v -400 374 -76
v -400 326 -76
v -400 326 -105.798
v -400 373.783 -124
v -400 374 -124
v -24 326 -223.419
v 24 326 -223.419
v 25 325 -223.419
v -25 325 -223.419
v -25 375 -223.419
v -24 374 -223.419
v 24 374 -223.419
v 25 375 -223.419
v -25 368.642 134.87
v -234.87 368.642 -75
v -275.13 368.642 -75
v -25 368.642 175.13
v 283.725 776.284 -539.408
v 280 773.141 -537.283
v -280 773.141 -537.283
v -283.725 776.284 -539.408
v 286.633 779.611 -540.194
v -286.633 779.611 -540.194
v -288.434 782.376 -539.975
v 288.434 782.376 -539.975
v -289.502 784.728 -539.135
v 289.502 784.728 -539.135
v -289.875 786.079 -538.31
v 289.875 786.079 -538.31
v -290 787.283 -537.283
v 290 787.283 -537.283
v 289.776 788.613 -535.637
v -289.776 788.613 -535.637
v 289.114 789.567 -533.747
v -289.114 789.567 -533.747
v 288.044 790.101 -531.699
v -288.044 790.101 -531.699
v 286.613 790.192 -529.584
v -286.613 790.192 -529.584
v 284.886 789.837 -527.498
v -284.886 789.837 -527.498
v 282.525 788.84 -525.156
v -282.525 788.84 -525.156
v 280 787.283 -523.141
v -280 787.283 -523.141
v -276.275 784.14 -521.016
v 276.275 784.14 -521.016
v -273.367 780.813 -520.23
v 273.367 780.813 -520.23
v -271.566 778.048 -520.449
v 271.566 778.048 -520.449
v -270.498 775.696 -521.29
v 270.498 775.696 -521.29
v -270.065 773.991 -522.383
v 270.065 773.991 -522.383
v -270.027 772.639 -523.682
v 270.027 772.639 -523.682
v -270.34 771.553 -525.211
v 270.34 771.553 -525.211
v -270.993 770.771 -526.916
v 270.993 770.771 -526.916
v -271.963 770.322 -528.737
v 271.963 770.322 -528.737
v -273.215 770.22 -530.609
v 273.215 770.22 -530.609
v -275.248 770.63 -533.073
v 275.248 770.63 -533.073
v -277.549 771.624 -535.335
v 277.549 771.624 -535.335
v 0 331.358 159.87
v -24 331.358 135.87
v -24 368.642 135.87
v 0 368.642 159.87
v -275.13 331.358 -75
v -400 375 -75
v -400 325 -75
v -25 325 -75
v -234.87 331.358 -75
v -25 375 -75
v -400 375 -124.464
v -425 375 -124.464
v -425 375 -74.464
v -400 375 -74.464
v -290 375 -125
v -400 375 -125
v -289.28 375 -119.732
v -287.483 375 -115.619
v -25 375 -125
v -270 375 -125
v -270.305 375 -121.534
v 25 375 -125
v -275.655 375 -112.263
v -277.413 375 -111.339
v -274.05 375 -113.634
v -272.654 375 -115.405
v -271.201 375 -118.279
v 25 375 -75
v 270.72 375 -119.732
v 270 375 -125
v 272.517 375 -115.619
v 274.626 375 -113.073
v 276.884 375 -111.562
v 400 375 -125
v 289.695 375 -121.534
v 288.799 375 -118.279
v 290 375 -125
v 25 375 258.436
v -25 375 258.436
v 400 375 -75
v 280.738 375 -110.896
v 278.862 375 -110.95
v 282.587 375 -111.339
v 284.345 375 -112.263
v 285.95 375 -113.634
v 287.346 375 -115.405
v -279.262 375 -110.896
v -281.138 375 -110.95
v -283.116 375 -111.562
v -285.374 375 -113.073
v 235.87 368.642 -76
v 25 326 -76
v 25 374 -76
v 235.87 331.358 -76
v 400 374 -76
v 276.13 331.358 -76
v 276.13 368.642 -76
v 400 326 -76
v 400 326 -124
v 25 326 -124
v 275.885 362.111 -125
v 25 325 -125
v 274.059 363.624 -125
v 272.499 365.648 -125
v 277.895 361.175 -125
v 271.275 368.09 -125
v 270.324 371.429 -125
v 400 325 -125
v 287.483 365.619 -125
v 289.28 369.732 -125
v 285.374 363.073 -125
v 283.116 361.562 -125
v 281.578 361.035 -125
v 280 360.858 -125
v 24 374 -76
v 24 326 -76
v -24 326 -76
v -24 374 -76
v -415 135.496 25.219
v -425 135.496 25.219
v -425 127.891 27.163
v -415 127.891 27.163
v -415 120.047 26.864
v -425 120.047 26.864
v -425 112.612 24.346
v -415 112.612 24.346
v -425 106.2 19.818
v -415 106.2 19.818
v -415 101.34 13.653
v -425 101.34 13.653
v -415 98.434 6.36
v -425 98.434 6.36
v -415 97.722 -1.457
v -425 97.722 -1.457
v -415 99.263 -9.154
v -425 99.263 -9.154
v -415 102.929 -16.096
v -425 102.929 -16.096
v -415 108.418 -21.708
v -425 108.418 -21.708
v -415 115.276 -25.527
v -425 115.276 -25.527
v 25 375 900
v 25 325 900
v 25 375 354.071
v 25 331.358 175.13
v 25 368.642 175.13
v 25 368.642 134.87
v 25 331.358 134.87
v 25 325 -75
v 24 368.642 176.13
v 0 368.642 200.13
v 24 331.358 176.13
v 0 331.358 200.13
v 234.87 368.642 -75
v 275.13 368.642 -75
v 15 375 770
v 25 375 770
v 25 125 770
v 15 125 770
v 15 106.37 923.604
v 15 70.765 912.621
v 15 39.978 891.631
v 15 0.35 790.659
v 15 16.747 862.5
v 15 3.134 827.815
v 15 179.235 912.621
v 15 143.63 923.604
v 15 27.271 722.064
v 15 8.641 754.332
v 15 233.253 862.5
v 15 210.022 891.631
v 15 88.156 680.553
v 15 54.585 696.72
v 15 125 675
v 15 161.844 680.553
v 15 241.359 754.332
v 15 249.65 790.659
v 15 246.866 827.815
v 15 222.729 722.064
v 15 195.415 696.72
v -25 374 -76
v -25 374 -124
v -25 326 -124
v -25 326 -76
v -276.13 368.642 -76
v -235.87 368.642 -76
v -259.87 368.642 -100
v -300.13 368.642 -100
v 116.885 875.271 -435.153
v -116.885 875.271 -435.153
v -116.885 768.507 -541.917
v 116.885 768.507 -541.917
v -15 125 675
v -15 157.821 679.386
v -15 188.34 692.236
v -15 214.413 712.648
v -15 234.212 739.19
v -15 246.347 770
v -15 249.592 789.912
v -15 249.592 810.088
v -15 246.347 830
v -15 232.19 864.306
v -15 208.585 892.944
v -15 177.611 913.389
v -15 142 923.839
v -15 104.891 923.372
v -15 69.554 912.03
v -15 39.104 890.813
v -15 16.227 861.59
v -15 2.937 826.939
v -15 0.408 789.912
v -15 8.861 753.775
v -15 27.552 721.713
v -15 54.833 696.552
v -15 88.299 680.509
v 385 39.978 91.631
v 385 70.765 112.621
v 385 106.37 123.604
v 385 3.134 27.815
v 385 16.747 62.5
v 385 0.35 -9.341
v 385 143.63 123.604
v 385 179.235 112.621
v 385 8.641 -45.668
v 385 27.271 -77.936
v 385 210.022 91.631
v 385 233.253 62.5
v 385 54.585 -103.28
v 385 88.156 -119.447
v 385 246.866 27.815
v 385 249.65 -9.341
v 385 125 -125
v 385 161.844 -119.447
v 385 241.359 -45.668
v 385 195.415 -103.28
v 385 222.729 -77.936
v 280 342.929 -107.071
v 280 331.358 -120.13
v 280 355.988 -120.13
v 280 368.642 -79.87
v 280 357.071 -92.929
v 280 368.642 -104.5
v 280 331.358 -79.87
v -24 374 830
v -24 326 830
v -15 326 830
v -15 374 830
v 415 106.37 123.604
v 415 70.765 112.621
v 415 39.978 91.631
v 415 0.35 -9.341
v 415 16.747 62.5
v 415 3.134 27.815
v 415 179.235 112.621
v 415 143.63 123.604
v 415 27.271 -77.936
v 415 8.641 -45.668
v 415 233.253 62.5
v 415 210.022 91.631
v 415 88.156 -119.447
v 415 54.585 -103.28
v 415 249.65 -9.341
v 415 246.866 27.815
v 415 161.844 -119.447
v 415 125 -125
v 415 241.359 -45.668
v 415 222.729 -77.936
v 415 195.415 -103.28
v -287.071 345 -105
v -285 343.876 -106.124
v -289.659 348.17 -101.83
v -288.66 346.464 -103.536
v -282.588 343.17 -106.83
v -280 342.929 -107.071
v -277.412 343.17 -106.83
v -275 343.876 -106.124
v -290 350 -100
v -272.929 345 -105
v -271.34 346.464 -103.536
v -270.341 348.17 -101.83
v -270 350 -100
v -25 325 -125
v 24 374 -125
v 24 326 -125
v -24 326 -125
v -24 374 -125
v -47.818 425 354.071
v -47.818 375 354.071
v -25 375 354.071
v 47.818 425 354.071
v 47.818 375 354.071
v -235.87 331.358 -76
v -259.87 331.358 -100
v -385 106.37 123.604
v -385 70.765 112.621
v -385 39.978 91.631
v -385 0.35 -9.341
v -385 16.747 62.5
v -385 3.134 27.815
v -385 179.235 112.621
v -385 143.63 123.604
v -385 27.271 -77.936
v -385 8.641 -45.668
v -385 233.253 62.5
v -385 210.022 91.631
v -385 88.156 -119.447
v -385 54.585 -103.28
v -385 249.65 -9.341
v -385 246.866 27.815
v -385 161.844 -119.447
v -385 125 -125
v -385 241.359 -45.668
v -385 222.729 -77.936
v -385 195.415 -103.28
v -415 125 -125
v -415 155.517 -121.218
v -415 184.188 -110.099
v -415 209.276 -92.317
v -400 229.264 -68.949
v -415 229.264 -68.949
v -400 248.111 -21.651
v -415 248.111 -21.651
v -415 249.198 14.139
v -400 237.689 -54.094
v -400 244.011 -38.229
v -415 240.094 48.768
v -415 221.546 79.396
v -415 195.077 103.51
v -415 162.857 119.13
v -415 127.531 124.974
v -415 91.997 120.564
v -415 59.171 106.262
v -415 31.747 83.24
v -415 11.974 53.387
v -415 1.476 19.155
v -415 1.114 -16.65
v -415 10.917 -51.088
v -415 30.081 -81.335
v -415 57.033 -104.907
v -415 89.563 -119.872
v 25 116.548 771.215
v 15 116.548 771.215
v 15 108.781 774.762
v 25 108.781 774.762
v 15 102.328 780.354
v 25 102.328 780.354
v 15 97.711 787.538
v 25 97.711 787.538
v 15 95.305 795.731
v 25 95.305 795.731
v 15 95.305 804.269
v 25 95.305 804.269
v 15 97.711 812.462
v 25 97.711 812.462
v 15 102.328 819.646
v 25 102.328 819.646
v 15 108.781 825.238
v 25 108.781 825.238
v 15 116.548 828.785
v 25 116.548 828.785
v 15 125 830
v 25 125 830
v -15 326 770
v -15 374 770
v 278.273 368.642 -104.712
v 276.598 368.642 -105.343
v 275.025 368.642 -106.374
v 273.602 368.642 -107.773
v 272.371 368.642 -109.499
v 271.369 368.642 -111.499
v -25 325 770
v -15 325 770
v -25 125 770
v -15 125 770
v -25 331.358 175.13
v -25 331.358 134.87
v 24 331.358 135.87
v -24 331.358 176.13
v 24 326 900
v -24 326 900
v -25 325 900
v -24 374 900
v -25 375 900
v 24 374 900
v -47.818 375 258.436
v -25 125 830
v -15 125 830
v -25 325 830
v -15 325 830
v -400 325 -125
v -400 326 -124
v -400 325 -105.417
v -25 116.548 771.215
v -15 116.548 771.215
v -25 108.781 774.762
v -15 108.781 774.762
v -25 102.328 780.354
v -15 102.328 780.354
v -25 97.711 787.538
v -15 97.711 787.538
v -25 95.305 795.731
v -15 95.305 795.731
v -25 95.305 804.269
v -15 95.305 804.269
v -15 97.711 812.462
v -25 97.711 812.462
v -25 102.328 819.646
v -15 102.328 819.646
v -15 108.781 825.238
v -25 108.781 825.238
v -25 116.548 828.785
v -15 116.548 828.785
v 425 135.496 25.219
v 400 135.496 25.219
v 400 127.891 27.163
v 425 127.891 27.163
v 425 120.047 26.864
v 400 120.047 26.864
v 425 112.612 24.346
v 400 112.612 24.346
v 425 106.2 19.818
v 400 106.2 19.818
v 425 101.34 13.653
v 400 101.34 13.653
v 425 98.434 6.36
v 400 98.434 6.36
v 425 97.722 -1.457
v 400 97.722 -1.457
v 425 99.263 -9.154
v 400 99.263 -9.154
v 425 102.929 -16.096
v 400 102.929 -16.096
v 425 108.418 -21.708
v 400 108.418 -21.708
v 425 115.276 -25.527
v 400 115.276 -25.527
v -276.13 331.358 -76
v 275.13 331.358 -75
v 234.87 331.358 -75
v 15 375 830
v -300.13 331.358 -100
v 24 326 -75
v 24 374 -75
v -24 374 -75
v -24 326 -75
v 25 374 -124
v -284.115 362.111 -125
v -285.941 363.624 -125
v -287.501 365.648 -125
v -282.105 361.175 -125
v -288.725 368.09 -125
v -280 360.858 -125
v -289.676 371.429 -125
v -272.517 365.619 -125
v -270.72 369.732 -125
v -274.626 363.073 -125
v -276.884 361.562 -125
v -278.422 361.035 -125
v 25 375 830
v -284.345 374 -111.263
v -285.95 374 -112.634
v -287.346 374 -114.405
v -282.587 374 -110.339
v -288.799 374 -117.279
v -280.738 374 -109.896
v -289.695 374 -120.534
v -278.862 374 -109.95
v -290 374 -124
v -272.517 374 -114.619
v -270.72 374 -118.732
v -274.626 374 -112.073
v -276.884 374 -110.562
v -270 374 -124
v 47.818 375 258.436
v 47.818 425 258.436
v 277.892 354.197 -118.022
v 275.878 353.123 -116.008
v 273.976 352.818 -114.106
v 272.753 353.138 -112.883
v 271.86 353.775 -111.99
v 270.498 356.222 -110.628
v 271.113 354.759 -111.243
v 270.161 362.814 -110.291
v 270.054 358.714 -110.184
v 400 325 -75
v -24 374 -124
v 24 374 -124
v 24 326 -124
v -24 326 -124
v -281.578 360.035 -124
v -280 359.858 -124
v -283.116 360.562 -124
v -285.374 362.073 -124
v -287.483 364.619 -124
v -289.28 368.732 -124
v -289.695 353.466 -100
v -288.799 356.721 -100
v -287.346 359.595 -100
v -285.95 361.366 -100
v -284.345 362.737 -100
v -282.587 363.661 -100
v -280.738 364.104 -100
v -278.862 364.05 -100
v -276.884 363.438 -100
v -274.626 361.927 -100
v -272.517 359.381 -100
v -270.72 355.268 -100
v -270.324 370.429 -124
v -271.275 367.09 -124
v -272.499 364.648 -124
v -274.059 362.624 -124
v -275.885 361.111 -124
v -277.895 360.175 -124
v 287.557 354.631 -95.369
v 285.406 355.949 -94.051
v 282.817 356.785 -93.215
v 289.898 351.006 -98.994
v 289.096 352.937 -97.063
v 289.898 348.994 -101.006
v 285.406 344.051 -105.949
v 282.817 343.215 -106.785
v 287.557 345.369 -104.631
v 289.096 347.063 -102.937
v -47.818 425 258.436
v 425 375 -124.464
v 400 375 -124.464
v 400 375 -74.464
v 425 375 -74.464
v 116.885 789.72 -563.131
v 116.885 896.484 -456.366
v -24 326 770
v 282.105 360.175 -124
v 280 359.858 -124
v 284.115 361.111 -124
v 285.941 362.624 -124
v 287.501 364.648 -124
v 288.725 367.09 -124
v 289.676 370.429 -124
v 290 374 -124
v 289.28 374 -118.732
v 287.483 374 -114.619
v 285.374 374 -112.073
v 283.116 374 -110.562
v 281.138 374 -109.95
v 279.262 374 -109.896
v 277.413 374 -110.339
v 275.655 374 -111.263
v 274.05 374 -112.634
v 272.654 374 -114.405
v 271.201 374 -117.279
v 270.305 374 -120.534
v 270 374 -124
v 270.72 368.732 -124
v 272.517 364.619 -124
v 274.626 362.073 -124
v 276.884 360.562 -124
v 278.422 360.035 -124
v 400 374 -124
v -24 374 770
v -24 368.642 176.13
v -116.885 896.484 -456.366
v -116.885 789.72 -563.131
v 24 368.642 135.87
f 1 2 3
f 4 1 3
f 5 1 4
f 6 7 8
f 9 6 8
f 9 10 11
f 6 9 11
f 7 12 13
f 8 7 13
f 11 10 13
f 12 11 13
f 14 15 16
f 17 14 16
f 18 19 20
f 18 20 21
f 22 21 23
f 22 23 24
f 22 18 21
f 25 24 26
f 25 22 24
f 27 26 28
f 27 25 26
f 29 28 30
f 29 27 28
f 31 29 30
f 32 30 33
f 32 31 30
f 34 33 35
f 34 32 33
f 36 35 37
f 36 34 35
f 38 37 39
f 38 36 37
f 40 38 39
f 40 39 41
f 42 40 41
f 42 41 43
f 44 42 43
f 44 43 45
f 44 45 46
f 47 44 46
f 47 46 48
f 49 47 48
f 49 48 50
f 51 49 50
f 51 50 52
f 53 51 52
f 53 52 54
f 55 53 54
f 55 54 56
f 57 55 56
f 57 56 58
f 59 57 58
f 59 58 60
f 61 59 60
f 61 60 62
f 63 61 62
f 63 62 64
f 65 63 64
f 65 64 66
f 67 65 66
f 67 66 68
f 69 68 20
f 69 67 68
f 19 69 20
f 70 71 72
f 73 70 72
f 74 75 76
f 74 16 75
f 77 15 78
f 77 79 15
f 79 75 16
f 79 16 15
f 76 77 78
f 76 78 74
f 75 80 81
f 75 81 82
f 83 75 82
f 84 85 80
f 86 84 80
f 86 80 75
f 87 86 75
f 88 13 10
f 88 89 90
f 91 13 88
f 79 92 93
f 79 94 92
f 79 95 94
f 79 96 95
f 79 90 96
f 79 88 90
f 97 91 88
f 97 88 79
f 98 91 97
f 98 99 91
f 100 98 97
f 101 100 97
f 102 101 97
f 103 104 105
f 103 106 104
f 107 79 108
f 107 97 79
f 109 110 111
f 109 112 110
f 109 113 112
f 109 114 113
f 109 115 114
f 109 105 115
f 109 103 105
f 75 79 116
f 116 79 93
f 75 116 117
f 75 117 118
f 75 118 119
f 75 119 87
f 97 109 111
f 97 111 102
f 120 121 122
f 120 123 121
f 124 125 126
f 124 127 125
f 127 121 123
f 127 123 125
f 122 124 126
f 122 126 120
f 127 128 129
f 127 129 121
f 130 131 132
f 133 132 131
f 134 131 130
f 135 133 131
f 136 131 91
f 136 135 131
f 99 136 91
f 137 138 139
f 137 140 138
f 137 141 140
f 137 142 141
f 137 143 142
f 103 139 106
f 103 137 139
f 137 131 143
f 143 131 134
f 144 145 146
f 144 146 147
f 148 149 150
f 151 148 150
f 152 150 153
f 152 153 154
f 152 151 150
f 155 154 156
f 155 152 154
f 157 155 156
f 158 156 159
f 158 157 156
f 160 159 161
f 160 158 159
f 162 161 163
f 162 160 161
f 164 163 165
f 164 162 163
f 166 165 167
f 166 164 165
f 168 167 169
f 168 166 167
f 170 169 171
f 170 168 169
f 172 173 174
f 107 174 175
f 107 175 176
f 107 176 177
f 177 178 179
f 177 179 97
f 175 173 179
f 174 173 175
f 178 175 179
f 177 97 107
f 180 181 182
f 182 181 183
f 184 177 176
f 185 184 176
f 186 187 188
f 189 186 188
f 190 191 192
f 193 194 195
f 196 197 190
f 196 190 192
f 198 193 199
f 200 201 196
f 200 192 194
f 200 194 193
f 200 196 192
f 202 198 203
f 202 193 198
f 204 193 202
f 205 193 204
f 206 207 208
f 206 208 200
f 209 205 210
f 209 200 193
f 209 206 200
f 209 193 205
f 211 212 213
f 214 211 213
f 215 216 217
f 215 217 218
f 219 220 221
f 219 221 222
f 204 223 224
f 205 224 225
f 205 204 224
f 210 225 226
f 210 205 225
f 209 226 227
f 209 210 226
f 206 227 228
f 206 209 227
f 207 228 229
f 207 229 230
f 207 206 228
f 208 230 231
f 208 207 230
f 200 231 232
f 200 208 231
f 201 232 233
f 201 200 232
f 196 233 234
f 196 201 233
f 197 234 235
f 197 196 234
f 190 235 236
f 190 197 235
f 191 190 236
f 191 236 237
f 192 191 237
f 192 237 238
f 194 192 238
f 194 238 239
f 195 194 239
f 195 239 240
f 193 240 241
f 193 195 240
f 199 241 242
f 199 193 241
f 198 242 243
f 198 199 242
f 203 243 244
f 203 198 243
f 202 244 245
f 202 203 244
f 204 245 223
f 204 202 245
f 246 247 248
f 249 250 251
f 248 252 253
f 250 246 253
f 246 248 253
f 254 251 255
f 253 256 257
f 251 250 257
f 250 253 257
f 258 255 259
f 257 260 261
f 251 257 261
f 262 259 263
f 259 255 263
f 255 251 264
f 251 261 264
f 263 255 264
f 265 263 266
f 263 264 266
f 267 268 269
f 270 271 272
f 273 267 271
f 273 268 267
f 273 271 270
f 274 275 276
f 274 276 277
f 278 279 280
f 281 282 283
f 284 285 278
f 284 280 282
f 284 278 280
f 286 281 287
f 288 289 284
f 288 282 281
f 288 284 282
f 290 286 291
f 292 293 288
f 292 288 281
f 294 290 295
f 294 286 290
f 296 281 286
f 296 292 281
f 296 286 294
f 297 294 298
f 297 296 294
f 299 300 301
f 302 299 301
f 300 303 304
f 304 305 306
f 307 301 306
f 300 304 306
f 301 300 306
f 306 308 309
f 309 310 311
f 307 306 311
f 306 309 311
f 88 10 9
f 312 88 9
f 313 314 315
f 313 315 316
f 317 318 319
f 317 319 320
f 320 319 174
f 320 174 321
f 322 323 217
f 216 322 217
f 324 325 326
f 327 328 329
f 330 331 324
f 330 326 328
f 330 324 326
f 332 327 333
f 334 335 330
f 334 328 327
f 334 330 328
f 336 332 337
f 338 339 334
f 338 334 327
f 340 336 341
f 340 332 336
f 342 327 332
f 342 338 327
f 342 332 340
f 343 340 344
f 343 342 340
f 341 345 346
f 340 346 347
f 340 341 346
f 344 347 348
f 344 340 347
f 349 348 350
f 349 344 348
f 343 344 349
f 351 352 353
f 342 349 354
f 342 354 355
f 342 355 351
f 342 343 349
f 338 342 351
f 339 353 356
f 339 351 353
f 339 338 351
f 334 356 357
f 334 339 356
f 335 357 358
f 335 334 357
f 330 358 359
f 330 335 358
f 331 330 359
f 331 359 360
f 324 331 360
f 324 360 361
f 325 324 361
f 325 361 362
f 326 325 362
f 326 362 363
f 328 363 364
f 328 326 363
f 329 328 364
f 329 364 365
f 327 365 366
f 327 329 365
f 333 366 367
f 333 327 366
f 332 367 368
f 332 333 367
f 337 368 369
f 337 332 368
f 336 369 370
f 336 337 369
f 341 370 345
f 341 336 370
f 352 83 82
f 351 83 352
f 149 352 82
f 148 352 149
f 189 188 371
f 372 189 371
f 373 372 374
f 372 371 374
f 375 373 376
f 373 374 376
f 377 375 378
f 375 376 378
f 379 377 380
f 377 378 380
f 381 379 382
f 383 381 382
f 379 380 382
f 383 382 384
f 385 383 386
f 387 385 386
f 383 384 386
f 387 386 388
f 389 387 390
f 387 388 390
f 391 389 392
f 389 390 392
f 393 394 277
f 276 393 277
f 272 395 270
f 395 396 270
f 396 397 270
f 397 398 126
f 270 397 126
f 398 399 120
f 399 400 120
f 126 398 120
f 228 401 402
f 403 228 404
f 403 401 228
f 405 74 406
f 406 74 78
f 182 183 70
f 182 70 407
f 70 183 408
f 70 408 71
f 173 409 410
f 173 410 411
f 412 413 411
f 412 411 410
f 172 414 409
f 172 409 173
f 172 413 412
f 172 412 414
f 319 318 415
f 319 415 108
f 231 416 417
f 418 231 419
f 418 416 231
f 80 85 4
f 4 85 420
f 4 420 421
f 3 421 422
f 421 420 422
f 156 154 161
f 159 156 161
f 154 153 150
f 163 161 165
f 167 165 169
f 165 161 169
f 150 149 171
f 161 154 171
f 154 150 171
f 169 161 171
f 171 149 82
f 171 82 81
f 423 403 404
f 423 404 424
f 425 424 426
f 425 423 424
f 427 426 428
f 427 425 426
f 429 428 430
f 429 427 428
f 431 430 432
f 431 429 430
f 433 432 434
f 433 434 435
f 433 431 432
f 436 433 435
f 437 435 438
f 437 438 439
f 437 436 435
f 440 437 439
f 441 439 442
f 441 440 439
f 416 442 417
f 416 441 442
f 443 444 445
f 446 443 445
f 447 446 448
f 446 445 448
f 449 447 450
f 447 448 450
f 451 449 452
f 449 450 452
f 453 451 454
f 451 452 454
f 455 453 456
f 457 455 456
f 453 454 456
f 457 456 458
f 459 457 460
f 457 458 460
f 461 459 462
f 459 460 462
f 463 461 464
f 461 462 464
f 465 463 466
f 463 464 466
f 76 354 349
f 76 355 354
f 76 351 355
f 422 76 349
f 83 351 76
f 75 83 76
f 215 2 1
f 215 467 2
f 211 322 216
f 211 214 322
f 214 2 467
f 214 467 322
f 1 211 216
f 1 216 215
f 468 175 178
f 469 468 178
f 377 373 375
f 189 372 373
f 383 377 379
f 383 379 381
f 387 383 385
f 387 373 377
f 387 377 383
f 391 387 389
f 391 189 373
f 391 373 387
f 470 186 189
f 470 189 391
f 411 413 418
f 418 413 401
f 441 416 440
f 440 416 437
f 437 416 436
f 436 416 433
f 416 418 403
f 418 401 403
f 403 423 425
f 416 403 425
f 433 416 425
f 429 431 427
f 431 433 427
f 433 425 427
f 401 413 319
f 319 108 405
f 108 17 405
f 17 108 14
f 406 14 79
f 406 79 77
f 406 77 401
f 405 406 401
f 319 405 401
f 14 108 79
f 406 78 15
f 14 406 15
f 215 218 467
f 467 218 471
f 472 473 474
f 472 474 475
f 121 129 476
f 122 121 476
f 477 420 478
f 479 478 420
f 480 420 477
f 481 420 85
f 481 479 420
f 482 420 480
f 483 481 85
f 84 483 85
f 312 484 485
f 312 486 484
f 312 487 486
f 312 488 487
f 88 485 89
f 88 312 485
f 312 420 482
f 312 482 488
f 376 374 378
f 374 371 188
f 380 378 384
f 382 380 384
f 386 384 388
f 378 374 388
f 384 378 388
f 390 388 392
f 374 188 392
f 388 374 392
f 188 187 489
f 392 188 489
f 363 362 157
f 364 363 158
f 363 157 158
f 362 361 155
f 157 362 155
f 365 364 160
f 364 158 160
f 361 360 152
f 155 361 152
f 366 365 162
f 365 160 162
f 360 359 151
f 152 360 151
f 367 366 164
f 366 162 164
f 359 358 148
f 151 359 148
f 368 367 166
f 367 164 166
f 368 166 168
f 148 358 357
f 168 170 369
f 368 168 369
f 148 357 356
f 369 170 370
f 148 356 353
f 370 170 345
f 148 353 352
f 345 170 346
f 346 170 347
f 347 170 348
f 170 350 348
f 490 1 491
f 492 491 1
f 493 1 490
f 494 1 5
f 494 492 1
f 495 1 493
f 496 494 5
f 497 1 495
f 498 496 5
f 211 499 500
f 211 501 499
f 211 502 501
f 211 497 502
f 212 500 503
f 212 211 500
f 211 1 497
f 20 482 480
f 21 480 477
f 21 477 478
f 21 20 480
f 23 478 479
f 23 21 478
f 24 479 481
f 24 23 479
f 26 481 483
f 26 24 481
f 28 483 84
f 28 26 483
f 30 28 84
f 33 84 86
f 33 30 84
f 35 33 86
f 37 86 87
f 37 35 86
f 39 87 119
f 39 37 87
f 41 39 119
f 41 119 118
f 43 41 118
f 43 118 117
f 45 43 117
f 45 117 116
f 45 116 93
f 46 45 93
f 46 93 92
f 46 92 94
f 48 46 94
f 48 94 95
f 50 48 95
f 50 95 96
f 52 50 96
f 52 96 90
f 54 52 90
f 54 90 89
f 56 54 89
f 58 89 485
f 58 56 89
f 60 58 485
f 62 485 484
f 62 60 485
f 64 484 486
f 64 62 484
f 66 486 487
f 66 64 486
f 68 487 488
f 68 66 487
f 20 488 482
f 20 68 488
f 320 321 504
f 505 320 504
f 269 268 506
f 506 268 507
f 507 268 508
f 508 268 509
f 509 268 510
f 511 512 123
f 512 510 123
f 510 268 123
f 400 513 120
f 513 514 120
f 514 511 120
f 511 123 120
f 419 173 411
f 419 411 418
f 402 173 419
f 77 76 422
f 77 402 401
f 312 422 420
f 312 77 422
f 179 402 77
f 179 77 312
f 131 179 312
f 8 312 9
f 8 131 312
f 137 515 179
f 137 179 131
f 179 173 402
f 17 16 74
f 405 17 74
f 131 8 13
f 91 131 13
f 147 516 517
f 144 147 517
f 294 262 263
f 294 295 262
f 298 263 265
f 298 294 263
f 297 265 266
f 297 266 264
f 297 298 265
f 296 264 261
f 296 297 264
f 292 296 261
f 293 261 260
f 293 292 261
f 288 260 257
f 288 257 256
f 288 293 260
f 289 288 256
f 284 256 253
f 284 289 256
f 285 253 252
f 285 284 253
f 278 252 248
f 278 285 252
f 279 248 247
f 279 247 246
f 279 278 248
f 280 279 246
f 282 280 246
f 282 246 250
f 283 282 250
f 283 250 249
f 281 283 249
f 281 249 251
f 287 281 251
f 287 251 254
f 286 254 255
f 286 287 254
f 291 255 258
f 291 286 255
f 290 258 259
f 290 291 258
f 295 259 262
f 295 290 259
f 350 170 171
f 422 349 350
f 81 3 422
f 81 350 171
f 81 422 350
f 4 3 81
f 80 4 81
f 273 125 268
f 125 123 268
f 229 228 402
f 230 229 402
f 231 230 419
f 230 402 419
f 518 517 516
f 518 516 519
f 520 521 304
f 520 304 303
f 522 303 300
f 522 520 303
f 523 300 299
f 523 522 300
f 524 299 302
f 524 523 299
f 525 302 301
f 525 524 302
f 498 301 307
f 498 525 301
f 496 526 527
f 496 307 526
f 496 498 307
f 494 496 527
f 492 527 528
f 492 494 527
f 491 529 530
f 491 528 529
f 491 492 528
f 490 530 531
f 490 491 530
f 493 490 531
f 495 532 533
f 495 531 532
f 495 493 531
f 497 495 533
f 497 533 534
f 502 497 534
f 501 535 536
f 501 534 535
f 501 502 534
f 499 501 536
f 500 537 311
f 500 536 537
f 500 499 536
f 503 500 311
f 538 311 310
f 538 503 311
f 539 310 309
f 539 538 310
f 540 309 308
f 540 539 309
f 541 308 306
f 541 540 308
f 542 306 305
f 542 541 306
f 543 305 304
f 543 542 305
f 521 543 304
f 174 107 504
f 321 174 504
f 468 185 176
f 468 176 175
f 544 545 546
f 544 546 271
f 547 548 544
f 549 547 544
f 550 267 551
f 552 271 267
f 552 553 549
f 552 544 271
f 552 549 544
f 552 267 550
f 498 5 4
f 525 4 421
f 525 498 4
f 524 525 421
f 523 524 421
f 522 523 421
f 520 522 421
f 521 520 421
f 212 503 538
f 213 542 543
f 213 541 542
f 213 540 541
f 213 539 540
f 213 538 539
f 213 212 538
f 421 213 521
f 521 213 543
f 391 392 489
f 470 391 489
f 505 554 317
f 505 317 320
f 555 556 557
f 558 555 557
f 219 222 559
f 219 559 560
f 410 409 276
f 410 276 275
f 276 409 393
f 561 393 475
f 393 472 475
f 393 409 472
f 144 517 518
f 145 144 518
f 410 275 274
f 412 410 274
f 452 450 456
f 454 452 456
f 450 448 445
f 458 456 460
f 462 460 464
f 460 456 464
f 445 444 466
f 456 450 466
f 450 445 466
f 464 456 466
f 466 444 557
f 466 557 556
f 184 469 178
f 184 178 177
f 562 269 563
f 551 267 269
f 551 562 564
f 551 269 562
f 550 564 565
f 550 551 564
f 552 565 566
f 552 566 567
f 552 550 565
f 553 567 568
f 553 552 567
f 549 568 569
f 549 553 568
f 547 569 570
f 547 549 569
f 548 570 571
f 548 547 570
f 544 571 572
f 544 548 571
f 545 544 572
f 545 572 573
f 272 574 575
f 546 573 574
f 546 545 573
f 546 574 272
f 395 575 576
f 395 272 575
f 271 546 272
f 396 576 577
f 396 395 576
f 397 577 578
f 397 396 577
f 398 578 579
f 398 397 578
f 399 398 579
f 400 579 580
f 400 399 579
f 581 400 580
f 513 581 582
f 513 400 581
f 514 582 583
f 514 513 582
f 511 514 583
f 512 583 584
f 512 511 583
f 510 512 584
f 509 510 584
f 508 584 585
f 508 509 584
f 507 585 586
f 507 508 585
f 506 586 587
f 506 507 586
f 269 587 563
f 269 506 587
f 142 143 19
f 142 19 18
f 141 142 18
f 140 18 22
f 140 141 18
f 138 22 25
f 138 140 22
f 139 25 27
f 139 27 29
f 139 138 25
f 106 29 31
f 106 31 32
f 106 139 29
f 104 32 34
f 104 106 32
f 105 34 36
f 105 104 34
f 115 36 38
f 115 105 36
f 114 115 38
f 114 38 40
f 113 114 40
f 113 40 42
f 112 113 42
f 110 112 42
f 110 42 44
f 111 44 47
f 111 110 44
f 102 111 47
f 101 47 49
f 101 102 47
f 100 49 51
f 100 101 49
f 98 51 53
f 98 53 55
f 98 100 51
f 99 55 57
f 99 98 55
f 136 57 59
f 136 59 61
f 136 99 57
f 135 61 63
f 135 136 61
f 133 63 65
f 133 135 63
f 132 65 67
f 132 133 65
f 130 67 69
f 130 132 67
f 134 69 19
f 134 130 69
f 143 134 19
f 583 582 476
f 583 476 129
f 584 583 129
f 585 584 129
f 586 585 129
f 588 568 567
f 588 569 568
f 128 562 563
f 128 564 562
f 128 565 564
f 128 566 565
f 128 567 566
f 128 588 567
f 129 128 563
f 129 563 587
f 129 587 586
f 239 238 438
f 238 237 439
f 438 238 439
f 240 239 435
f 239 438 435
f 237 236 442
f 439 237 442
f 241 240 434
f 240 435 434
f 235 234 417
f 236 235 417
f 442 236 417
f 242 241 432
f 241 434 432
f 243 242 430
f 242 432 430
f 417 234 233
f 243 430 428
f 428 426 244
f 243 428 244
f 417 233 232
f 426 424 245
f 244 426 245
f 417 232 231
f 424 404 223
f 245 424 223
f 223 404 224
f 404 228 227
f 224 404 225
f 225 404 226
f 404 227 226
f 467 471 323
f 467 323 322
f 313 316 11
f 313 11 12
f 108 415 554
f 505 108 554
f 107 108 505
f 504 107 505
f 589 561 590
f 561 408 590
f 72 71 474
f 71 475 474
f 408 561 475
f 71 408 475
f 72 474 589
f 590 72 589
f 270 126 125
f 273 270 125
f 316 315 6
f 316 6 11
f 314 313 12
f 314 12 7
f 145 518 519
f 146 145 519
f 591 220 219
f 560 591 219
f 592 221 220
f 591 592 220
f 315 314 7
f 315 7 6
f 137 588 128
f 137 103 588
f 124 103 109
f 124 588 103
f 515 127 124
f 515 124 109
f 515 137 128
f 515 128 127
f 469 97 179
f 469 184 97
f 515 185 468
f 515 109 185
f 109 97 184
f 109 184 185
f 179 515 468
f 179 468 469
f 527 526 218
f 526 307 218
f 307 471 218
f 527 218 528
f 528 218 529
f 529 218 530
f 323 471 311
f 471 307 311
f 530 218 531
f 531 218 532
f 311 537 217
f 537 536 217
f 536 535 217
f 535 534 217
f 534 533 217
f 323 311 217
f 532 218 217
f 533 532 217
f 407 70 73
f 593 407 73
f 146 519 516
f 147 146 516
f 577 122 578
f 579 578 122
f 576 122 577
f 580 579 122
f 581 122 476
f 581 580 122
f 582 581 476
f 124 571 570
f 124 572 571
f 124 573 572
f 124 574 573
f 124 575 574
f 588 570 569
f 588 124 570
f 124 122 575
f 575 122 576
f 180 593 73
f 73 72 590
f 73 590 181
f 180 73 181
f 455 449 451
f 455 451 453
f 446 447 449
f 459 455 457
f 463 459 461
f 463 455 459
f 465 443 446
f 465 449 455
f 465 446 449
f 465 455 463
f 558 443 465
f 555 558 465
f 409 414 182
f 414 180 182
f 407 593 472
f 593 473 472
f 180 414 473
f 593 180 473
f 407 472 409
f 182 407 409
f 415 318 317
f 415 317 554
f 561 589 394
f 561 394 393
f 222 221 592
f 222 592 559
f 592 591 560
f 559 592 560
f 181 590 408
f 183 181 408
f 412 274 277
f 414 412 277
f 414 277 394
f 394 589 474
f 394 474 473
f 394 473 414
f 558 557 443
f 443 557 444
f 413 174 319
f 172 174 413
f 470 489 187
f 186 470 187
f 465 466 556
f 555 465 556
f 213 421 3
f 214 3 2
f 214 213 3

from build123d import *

# Parameters (mm, degrees)
FWD_AFT_BEAM_XS_W         = 50
FWD_AFT_BEAM_XS_H         = 50
FWD_AFT_BEAM_XS_W_2       = 48
FWD_AFT_BEAM_XS_H_2       = 48
LAT_BEAM_XS_W             = 50
LAT_BEAM_XS_H             = 50
LAT_BEAM_XS_W_2           = 48
LAT_BEAM_XS_H_2           = 48
FRONT_WHEEL_SKETCH_R      = 125
BOSS_EXTRUDE1_DEPTH       = 15
REAR_RIGHT_WHEEL_SKETCH_R = 125
BOSS_EXTRUDE2_DEPTH       = 15
REAR_LEFT_WHEEL_SKETCH_R  = 125
BOSS_EXTRUDE3_DEPTH       = 15
SWEEP1_PROFILE_R          = 10
SKETCH14_W                = 40.260144978
SKETCH14_H                = 37.28401926
BOSS_EXTRUDE4_START       = 25
BOSS_EXTRUDE4_DEPTH       = 10
BOSS_EXTRUDE5_START       = 400
BOSS_EXTRUDE5_DEPTH       = 25
SKETCH17_W                = 233.770866628
SKETCH17_H                = 150.987210946
BOSS_EXTRUDE6_DEPTH       = 30
SKETCH20_W                = 95.63546101
SKETCH20_H                = 95.635461009
BOSS_EXTRUDE7_DEPTH       = 50


# Read off the part's stored shape, not the designer's step: Boss-Extrude5
with BuildPart() as part:
    # fwd-aft-beam: sweep along a path in fwd-aft-beam-profile
    with BuildLine(Plane(origin=(0, 350, -250), x_dir=(1, 0, 0), z_dir=(0, -1, 0))) as fwd_aft_beam_path:
        Line((0, 1150), (0, 26.58102252))
    # fwd-aft-beam-xs → fwd-aft-beam (sweep)
    with BuildSketch(Plane.XY):
        with Locations((0, 350)):
            Rectangle(FWD_AFT_BEAM_XS_W, FWD_AFT_BEAM_XS_H)
        with Locations((0, 350)):
            Rectangle(FWD_AFT_BEAM_XS_W_2, FWD_AFT_BEAM_XS_H_2, mode=Mode.SUBTRACT)
    sweep(path=fwd_aft_beam_path.line)

    # lat-beam: sweep along a path in lat-beam-profile
    with BuildLine(Plane(origin=(0, 350, 0), x_dir=(1, 0, 0), z_dir=(0, 1, 0))) as lat_beam_path:
        Line((-400, 100), (400, 100))
    # lat-beam-xs → lat-beam (sweep)
    with BuildSketch(Plane(origin=(0, 0, 0), x_dir=(0, 0, -1), z_dir=(1, 0, 0))):
        with Locations((100, 350)):
            Rectangle(LAT_BEAM_XS_W, LAT_BEAM_XS_H)
        with Locations((100, 350)):
            Rectangle(LAT_BEAM_XS_W_2, LAT_BEAM_XS_H_2, mode=Mode.SUBTRACT)
    sweep(path=lat_beam_path.line)

    # Sweep1: sweep along a path in Sketch1
    with BuildLine(Plane(origin=(0, 125, 125), x_dir=(1, 0, 0), z_dir=(0, 0.7071067811865488, 0.7071067811865464))) as sweep1_path:
        Line((-280, 318.198051534), (-280, 926.610024364))
        Line((-280, 926.610024364), (280, 926.610024364))
        Line((280, 926.610024364), (280, 318.198051534))
    # Sweep1 profile (on start of the path) → Sweep1 (sweep)
    with BuildSketch(Plane(origin=(-280, 350, -100), x_dir=(0, -0.7071067811865488, -0.7071067811865464), z_dir=(0, 0.7071067811865464, -0.7071067811865488))):
        Circle(SWEEP1_PROFILE_R)
    sweep(path=sweep1_path.line, transition=Transition.RIGHT)

    # Sweep2: sweep along a path in frame-sketch
    with BuildLine(Plane(origin=(0, 350, 0), x_dir=(1, 0, 0), z_dir=(0, 1, 0))) as sweep2_path:
        Line((280, 100), (0, -180))
        Line((0, -180), (-280, 100))
    # Sketch14 → Sweep2 (sweep)
    with BuildSketch(Plane.XY.offset(-100)):
        with Locations((-280, 350)):
            Rectangle(SKETCH14_W, SKETCH14_H)
    sweep(path=sweep2_path.line, transition=Transition.RIGHT)


with BuildPart() as body_2:
    # front-wheel-sketch → Boss-Extrude1 (new, symmetric)
    with BuildSketch(Plane(origin=(0, 0, 0), x_dir=(0, 0, -1), z_dir=(1, 0, 0))):
        with Locations((-800, 125)):
            Circle(FRONT_WHEEL_SKETCH_R)
    extrude(amount=BOSS_EXTRUDE1_DEPTH, both=True)


with BuildPart() as body_3:
    # rear-right-wheel-sketch → Boss-Extrude2 (new, symmetric)
    with BuildSketch(Plane(origin=(-400, 0, 0), x_dir=(0, 0, -1), z_dir=(1, 0, 0))):
        with Locations((0, 125)):
            Circle(REAR_RIGHT_WHEEL_SKETCH_R)
    extrude(amount=BOSS_EXTRUDE2_DEPTH, both=True)


with BuildPart() as body_4:
    # rear-left-wheel-sketch → Boss-Extrude3 (new, symmetric)
    with BuildSketch(Plane(origin=(400, 0, 0), x_dir=(0, 0, -1), z_dir=(1, 0, 0))):
        with Locations((0, 125)):
            Circle(REAR_LEFT_WHEEL_SKETCH_R)
    extrude(amount=BOSS_EXTRUDE3_DEPTH, both=True)


with BuildPart() as body_5:
    # Sketch16 → Boss-Extrude4 (new body)
    with BuildSketch(Plane(origin=(0, 0, 0), x_dir=(0, 0, -1), z_dir=(1, 0, 0)).offset(BOSS_EXTRUDE4_START)):
        with BuildLine():
            Line((-830, 375), (-770, 375))
            Line((-770, 375), (-770, 125))
            ThreePointArc((-770, 125), (-800, 95), (-830, 125))
            Line((-830, 125), (-830, 375))
        make_face()
    boss_extrude4 = extrude(amount=-BOSS_EXTRUDE4_DEPTH)


with BuildPart() as body_6:
    # Boss-Extrude5 outline → Boss-Extrude5 (new body)
    with BuildSketch(Plane(origin=(0, 0, 0), x_dir=(0, 0, -1), z_dir=(1, 0, 0)).offset(BOSS_EXTRUDE5_START)):
        with BuildLine():
            Line((74.463590991, 375), (-25.219339933, 135.496452983))
            ThreePointArc((-25.219339933, 135.496452983), (-10.111410838, 99.623830022), (25.527121699, 115.27597359))
            Line((25.527121699, 115.27597359), (124.463590991, 375))
            Line((124.463590991, 375), (74.463590991, 375))
        make_face()
    boss_extrude5 = extrude(amount=BOSS_EXTRUDE5_DEPTH)


with BuildPart() as body_7:
    # Sketch17 → Boss-Extrude6 (new body)
    with BuildSketch(Plane(origin=(0, 655.212231743, -655.212231743), x_dir=(1, 0, 0), z_dir=(0, -0.7071067811865488, 0.7071067811865464))):
        with Locations((0, 235.716812854)):
            Rectangle(SKETCH17_W, SKETCH17_H)
    extrude(amount=-BOSS_EXTRUDE6_DEPTH)


with BuildPart() as part_1:
    add(part.part)

    add(body_2.part)  # Mirror7 merges body 2

    add(body_3.part)  # Mirror7 merges body 3
    # Mirror7: Boss-Extrude4, Boss-Extrude5 across plane
    add(boss_extrude4.mirror(Plane(origin=(0, 0, 0), x_dir=(0, 0, 1), z_dir=(1, 0, 0))))
    add(boss_extrude5.mirror(Plane(origin=(0, 0, 0), x_dir=(0, 0, 1), z_dir=(1, 0, 0))))

    # Sketch20 → Boss-Extrude7 (add)
    with BuildSketch(Plane(origin=(0, 375, 0), x_dir=(1, 0, 0), z_dir=(0, 1, 0))):
        with Locations((0, -306.253298001)):
            Rectangle(SKETCH20_W, SKETCH20_H)
    extrude(amount=BOSS_EXTRUDE7_DEPTH)


solid = Compound([body_4.part, body_5.part, body_6.part, body_7.part, part_1.part])
